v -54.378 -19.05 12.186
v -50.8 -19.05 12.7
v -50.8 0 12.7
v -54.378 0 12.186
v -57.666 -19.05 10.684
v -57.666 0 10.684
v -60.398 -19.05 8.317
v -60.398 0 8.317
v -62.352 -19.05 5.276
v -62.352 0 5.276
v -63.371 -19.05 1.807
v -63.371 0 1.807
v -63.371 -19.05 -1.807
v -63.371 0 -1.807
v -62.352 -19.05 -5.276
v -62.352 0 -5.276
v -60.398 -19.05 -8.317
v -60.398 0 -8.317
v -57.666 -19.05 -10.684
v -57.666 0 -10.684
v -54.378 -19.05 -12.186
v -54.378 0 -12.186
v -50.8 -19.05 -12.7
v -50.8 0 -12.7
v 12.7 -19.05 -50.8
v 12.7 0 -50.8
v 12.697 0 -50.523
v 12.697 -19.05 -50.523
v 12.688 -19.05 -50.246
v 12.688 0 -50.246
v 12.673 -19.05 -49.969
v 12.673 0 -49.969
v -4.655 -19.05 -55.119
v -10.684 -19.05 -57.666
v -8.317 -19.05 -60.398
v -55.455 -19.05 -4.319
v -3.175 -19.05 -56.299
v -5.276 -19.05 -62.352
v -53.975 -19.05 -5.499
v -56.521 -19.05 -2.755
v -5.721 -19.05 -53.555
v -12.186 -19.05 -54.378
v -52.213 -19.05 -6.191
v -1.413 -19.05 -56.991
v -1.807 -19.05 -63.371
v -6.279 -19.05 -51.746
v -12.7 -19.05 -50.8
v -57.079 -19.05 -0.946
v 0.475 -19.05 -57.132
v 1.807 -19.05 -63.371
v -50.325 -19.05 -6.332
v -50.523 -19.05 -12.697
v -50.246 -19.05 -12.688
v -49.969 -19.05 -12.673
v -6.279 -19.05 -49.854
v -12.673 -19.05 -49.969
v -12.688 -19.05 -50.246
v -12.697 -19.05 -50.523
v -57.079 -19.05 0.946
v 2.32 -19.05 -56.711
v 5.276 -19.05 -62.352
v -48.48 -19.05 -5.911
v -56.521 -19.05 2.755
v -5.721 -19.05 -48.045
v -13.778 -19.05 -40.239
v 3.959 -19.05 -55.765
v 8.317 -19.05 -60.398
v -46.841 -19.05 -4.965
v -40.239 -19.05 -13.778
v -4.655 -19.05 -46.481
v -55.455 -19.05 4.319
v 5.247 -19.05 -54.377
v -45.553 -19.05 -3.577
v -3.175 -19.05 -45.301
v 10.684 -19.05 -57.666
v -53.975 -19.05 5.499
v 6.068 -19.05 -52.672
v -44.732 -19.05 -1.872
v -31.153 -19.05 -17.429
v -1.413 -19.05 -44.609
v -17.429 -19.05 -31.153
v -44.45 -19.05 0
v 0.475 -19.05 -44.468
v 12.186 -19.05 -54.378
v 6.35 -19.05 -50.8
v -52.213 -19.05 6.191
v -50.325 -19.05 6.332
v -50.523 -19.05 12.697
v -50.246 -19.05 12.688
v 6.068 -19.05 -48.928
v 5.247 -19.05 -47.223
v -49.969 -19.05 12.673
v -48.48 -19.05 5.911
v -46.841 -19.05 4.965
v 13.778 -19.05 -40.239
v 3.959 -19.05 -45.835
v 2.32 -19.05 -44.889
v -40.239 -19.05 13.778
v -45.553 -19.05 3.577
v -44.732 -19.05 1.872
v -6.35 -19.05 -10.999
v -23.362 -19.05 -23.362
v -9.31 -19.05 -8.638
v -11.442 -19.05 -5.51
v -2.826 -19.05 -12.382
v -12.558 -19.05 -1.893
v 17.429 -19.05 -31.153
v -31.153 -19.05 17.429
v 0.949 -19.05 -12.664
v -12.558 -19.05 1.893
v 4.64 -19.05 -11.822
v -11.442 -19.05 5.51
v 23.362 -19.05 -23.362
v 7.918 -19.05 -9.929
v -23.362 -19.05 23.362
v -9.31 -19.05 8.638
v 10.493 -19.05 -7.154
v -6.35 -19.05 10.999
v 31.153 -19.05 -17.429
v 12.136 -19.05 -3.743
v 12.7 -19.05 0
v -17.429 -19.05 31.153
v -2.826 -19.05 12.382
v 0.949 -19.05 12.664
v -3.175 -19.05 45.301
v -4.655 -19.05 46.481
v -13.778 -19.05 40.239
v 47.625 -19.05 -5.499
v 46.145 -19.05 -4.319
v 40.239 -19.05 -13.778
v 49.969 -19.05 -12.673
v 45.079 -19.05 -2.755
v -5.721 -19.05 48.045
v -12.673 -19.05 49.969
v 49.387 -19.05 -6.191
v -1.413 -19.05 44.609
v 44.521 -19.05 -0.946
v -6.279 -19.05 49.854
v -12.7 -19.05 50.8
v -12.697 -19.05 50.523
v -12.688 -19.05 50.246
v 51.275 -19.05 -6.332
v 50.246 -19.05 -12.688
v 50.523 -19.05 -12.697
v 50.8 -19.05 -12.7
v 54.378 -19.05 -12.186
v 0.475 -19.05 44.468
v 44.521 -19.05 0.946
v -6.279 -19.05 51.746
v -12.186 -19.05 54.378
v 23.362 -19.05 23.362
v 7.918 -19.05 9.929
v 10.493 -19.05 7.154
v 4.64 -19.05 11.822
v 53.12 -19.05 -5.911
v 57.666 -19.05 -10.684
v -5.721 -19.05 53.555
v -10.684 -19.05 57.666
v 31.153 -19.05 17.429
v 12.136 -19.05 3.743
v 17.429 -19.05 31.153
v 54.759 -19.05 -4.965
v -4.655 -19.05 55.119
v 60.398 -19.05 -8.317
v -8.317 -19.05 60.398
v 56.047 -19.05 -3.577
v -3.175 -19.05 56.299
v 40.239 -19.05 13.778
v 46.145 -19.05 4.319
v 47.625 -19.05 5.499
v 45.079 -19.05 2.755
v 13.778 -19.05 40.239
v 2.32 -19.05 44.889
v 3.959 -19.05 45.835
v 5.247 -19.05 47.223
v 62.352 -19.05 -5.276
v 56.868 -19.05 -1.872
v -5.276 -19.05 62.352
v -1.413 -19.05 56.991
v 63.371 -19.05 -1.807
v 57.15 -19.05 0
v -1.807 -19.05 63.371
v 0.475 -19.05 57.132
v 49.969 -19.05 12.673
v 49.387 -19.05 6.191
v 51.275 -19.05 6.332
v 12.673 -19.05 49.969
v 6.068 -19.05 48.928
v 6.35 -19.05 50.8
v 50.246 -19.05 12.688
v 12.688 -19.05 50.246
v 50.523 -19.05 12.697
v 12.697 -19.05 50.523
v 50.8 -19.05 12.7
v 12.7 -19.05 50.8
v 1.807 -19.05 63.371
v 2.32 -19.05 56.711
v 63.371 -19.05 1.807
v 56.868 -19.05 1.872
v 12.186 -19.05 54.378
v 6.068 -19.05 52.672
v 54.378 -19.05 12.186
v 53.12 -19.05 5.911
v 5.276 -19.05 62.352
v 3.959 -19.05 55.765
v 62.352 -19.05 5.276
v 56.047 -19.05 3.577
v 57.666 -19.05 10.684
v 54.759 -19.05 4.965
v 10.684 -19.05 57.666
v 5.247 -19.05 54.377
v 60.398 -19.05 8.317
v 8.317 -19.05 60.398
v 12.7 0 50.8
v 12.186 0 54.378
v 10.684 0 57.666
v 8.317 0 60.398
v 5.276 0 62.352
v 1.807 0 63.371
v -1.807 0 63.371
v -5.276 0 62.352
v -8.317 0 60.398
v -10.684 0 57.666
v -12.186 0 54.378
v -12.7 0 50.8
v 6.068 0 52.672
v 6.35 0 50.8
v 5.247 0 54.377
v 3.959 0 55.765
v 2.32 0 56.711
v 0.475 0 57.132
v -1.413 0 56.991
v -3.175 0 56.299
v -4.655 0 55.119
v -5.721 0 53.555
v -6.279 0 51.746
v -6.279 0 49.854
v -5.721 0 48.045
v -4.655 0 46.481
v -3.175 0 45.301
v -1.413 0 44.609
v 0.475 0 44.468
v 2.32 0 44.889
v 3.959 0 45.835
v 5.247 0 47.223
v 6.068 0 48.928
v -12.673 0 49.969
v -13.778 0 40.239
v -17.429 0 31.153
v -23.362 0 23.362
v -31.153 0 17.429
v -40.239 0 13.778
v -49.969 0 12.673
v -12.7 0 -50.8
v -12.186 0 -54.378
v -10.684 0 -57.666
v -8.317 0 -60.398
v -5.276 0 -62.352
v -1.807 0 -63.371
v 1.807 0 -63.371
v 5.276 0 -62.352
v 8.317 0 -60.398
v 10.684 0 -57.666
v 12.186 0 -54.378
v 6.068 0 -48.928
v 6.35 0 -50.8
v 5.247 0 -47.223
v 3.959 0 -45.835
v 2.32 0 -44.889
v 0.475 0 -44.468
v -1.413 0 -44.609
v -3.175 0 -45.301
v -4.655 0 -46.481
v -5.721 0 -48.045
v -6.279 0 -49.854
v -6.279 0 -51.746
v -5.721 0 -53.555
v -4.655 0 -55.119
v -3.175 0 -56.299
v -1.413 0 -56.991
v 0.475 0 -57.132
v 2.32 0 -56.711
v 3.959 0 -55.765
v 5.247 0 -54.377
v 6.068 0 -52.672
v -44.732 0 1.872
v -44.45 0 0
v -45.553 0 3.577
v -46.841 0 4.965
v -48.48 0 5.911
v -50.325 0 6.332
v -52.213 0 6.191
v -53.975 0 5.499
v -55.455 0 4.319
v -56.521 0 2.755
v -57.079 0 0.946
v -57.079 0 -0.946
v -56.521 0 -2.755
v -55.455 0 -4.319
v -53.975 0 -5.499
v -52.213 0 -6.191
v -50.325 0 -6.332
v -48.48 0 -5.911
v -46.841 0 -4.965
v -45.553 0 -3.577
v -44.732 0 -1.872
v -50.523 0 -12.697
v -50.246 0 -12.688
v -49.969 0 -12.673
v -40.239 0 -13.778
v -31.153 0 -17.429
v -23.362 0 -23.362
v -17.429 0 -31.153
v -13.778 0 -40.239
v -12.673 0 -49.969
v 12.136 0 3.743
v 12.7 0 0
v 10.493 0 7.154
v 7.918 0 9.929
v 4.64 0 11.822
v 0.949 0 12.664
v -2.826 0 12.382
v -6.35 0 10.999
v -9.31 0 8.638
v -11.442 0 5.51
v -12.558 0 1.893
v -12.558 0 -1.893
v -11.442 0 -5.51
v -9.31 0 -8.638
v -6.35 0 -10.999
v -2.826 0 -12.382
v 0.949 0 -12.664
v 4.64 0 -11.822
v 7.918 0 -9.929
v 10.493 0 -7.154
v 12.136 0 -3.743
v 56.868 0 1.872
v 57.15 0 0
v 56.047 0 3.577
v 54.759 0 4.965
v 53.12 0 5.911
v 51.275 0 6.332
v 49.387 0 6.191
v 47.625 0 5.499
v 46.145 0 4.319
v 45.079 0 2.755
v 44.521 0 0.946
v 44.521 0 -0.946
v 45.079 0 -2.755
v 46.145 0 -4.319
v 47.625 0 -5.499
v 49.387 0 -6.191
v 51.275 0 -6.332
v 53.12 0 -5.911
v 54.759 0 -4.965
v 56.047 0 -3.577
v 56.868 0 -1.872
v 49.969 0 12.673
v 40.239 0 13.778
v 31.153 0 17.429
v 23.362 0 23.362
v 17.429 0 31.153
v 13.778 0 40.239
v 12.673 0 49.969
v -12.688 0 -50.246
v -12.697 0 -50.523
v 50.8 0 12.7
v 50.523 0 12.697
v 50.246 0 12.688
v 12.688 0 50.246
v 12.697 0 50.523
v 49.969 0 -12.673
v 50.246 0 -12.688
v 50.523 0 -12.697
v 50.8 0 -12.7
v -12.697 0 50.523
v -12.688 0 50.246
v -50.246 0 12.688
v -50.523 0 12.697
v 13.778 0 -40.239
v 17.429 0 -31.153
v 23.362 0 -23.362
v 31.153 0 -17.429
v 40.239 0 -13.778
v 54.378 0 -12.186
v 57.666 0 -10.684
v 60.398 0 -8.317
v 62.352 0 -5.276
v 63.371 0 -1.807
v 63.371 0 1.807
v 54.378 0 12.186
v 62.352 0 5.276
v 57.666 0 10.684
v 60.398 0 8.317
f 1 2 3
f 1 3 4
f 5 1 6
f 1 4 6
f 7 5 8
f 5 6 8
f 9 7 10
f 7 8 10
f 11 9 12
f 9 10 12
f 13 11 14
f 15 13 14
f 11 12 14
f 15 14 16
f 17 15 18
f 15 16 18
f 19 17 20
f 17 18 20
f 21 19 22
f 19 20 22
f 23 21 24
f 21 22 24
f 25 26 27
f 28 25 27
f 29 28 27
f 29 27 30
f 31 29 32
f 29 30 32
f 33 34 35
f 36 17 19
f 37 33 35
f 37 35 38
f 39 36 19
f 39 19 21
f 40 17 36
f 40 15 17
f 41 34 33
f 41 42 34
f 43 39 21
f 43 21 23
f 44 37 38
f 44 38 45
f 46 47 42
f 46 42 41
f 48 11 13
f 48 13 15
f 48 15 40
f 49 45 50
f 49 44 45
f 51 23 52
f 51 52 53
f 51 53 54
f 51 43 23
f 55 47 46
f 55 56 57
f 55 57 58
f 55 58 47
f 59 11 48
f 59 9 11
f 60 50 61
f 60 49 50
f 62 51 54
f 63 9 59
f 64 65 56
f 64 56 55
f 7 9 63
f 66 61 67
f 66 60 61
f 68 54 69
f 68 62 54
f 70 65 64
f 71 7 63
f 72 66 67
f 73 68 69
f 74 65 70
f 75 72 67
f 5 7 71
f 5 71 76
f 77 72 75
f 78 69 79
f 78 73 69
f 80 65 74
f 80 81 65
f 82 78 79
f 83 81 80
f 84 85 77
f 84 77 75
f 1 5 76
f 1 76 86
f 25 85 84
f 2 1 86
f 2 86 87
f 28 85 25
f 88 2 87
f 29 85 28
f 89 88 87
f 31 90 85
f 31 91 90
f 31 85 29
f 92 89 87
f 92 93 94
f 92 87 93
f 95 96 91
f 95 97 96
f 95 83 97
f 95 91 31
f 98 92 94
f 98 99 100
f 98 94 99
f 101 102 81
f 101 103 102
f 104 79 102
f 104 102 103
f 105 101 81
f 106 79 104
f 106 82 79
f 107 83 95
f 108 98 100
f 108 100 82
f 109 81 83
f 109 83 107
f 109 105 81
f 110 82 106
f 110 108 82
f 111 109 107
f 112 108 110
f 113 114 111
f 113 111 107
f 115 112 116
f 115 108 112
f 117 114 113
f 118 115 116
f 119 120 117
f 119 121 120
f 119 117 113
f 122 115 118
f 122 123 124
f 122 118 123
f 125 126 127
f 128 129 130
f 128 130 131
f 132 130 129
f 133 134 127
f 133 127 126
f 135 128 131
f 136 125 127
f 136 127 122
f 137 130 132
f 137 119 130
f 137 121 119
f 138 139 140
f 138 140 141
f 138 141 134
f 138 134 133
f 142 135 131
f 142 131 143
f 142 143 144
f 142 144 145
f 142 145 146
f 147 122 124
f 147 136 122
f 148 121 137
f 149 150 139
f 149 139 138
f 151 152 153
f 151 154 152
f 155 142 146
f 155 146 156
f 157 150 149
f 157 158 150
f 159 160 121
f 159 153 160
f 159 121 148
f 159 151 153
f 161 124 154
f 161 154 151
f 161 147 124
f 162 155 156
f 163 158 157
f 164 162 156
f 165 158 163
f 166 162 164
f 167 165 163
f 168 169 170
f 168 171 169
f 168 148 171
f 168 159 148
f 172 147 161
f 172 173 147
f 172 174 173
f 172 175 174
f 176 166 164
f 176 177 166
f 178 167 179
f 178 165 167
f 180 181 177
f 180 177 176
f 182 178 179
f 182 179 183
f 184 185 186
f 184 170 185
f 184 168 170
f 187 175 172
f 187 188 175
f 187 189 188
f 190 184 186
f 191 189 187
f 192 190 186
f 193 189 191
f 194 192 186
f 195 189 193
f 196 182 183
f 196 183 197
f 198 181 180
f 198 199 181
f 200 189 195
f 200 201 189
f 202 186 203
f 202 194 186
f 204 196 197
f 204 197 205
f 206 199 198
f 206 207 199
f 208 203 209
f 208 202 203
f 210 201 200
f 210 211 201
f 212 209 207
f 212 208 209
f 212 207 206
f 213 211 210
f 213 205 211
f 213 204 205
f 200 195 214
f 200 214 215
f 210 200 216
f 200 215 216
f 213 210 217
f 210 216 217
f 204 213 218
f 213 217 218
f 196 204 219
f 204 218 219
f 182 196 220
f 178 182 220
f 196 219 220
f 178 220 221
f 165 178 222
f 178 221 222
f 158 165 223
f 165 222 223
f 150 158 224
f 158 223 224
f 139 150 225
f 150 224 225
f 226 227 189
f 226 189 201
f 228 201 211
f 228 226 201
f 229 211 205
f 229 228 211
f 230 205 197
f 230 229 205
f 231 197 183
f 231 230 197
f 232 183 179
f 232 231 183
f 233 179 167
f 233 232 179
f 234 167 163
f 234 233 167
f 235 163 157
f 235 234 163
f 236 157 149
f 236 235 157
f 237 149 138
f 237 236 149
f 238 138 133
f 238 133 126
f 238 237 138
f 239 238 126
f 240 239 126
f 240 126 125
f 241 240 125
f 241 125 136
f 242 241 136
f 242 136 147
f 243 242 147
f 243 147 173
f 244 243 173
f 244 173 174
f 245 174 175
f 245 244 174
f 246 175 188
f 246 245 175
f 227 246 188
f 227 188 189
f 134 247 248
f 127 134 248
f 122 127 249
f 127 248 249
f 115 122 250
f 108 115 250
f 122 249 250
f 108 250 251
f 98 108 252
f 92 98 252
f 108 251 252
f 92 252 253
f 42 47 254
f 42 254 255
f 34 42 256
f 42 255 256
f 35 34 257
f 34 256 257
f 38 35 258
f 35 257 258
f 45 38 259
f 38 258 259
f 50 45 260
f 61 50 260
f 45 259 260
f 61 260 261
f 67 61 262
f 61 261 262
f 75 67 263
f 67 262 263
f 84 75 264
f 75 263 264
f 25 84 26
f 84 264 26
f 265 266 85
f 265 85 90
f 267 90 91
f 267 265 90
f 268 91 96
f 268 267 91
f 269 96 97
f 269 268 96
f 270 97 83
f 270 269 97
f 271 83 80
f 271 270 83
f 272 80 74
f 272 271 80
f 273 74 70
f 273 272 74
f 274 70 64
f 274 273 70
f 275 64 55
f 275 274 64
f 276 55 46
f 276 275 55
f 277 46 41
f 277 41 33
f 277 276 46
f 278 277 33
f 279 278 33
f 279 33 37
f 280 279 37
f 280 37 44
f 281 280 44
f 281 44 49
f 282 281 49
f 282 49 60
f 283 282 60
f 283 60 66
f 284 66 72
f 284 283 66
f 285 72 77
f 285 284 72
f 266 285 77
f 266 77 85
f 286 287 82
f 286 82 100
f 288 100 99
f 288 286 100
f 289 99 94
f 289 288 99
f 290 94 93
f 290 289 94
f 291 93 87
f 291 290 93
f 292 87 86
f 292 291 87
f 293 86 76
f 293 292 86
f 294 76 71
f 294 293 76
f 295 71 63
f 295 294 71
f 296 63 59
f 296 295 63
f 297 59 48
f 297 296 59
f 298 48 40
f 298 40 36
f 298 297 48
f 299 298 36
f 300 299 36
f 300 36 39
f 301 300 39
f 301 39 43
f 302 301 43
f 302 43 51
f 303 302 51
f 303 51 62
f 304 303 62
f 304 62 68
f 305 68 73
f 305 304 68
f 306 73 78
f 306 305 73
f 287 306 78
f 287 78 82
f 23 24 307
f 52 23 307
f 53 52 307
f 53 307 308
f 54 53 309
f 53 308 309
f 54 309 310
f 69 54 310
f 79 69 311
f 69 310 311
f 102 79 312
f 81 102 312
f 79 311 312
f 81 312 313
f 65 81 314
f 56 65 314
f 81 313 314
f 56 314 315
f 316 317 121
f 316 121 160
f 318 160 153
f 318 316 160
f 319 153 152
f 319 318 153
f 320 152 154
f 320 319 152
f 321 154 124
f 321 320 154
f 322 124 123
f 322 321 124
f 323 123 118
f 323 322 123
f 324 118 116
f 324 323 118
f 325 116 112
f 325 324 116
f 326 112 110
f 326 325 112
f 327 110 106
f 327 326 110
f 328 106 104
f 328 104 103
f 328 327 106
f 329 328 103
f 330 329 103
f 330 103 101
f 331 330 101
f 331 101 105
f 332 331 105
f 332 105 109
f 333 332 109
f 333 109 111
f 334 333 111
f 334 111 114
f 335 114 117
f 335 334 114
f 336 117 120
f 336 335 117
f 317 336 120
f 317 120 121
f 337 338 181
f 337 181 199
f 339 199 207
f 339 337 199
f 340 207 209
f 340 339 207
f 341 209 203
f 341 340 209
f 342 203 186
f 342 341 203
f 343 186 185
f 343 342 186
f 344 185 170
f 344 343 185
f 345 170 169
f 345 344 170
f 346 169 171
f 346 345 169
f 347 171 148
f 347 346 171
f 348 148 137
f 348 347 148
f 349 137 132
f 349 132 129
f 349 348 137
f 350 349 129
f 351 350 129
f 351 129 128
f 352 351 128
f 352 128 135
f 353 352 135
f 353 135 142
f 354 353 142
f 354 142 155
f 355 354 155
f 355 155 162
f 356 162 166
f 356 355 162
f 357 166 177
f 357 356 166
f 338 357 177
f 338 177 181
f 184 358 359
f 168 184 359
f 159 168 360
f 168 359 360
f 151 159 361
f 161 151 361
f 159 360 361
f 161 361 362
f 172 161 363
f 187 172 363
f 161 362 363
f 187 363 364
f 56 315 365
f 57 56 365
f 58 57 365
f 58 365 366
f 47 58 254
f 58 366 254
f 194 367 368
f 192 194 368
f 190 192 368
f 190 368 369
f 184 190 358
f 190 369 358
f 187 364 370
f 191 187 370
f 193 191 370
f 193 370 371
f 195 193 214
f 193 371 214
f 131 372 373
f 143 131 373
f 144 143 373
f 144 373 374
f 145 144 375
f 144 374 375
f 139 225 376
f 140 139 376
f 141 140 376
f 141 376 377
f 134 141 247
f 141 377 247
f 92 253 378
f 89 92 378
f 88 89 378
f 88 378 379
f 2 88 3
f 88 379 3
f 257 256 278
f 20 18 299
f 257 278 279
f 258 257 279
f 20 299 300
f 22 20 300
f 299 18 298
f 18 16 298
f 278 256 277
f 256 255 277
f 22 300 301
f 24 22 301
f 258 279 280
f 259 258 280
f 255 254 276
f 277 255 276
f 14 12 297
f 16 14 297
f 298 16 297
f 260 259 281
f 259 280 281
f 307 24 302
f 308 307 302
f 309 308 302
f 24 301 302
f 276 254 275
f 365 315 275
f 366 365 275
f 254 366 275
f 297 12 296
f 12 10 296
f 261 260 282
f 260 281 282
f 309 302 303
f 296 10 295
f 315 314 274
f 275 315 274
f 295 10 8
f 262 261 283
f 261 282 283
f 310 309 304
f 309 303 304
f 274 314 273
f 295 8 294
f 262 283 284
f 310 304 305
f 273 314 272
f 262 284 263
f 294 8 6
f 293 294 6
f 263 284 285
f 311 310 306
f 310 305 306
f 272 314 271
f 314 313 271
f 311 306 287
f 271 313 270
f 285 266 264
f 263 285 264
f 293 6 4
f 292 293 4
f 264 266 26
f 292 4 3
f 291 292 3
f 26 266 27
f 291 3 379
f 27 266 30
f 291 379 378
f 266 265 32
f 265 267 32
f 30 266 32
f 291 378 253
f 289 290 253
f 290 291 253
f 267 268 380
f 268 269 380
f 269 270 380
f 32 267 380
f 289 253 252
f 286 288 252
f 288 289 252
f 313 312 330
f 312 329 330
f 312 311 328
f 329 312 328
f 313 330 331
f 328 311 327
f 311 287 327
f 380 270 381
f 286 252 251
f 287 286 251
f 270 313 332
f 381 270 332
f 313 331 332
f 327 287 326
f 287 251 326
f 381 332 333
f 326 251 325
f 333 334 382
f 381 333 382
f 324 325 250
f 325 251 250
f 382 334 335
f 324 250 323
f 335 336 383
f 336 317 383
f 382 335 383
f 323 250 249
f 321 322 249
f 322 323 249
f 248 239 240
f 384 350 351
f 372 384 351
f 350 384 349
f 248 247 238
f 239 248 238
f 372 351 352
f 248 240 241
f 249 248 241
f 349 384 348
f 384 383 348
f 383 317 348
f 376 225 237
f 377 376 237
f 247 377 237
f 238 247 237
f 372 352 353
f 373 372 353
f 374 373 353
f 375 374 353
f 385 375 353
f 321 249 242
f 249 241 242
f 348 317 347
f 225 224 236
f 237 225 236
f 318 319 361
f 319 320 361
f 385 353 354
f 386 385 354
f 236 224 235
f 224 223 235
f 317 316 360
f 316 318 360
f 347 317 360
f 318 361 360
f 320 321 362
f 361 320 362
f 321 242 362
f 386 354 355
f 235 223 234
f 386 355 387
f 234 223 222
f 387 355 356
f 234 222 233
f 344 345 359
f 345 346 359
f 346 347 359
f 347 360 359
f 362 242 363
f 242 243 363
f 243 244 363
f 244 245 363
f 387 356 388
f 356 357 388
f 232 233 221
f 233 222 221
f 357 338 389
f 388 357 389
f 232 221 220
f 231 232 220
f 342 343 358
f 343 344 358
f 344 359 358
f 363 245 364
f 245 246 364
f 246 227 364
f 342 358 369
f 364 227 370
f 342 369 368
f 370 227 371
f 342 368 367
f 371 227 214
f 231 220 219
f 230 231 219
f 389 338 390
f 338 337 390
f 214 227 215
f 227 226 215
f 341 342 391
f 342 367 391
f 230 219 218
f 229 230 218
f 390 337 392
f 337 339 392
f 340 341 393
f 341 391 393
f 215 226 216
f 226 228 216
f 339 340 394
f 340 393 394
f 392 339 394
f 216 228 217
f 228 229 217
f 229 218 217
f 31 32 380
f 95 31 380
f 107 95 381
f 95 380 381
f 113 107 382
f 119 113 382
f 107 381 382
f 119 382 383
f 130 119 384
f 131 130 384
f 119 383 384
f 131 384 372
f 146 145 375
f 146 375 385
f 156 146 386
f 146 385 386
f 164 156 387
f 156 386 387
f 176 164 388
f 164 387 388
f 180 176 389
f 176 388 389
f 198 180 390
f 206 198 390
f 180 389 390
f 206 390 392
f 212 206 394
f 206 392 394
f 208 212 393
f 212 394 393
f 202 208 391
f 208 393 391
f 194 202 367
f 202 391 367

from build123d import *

# Parameters (mm, degrees)
F0_R     = 6.35
F0_R_2   = 12.7
F1_DEPTH = 19.05


with BuildPart() as f1:
    # F0 (on Front) → F1 (new body)
    with BuildSketch(Plane.XZ):
        with BuildLine():
            ThreePointArc((12.7, 50.8), (12.684041, 50.384765), (12.672808, 49.969374))
            ThreePointArc((12.672808, 49.969374), (12.6932, 50.384465), (12.7, 50.8))
        make_face()
        with BuildLine():
            ThreePointArc((49.969374, 12.672808), (23.362469, 23.362469), (12.672808, 49.969374))
            ThreePointArc((12.672808, 49.969374), (12.684041, 50.384765), (12.7, 50.8))
            ThreePointArc((12.7, 50.8), (0, 63.5), (-12.7, 50.8))
            ThreePointArc((-12.7, 50.8), (-12.684041, 50.384765), (-12.672808, 49.969374))
            ThreePointArc((-12.672808, 49.969374), (-23.362469, 23.362469), (-49.969374, 12.672808))
            ThreePointArc((-49.969374, 12.672808), (-50.384765, 12.684041), (-50.8, 12.7))
            ThreePointArc((-50.8, 12.7), (-63.5, 0), (-50.8, -12.7))
            ThreePointArc((-50.8, -12.7), (-50.384765, -12.684041), (-49.969374, -12.672808))
            ThreePointArc((-49.969374, -12.672808), (-23.362469, -23.362469), (-12.672808, -49.969374))
            ThreePointArc((-12.672808, -49.969374), (-12.684041, -50.384765), (-12.7, -50.8))
            ThreePointArc((-12.7, -50.8), (0, -63.5), (12.7, -50.8))
            ThreePointArc((12.7, -50.8), (12.684041, -50.384765), (12.672808, -49.969374))
            ThreePointArc((12.672808, -49.969374), (23.362469, -23.362469), (49.969374, -12.672808))
            ThreePointArc((49.969374, -12.672808), (50.384765, -12.684041), (50.8, -12.7))
            ThreePointArc((50.8, -12.7), (63.5, 0), (50.8, 12.7))
            ThreePointArc((50.8, 12.7), (50.384765, 12.684041), (49.969374, 12.672808))
        make_face()
        with Locations((0, -50.8)):
            Circle(F0_R, mode=Mode.SUBTRACT)
        with Locations((-50.8, 0)):
            Circle(F0_R, mode=Mode.SUBTRACT)
        Circle(F0_R_2, mode=Mode.SUBTRACT)
        with Locations((50.8, 0)):
            Circle(F0_R, mode=Mode.SUBTRACT)
        with Locations((0, 50.8)):
            Circle(F0_R, mode=Mode.SUBTRACT)
        with BuildLine():
            ThreePointArc((50.8, 12.7), (50.384465, 12.6932), (49.969374, 12.672808))
            ThreePointArc((49.969374, 12.672808), (50.384765, 12.684041), (50.8, 12.7))
        make_face()
        with BuildLine():
            ThreePointArc((-12.672808, 49.969374), (-12.684041, 50.384765), (-12.7, 50.8))
            ThreePointArc((-12.7, 50.8), (-12.6932, 50.384465), (-12.672808, 49.969374))
        make_face()
        with BuildLine():
            ThreePointArc((49.969374, -12.672808), (50.384465, -12.6932), (50.8, -12.7))
            ThreePointArc((50.8, -12.7), (50.384765, -12.684041), (49.969374, -12.672808))
        make_face()
        with BuildLine():
            ThreePointArc((-50.8, 12.7), (-50.384765, 12.684041), (-49.969374, 12.672808))
            ThreePointArc((-49.969374, 12.672808), (-50.384465, 12.6932), (-50.8, 12.7))
        make_face()
        with BuildLine():
            ThreePointArc((12.7, -50.8), (12.6932, -50.384465), (12.672808, -49.969374))
            ThreePointArc((12.672808, -49.969374), (12.684041, -50.384765), (12.7, -50.8))
        make_face()
        with BuildLine():
            ThreePointArc((-49.969374, -12.672808), (-50.384765, -12.684041), (-50.8, -12.7))
            ThreePointArc((-50.8, -12.7), (-50.384465, -12.6932), (-49.969374, -12.672808))
        make_face()
        with BuildLine():
            ThreePointArc((-12.672808, -49.969374), (-12.6932, -50.384465), (-12.7, -50.8))
            ThreePointArc((-12.7, -50.8), (-12.684041, -50.384765), (-12.672808, -49.969374))
        make_face()
    extrude(amount=F1_DEPTH)


solid = f1.part
